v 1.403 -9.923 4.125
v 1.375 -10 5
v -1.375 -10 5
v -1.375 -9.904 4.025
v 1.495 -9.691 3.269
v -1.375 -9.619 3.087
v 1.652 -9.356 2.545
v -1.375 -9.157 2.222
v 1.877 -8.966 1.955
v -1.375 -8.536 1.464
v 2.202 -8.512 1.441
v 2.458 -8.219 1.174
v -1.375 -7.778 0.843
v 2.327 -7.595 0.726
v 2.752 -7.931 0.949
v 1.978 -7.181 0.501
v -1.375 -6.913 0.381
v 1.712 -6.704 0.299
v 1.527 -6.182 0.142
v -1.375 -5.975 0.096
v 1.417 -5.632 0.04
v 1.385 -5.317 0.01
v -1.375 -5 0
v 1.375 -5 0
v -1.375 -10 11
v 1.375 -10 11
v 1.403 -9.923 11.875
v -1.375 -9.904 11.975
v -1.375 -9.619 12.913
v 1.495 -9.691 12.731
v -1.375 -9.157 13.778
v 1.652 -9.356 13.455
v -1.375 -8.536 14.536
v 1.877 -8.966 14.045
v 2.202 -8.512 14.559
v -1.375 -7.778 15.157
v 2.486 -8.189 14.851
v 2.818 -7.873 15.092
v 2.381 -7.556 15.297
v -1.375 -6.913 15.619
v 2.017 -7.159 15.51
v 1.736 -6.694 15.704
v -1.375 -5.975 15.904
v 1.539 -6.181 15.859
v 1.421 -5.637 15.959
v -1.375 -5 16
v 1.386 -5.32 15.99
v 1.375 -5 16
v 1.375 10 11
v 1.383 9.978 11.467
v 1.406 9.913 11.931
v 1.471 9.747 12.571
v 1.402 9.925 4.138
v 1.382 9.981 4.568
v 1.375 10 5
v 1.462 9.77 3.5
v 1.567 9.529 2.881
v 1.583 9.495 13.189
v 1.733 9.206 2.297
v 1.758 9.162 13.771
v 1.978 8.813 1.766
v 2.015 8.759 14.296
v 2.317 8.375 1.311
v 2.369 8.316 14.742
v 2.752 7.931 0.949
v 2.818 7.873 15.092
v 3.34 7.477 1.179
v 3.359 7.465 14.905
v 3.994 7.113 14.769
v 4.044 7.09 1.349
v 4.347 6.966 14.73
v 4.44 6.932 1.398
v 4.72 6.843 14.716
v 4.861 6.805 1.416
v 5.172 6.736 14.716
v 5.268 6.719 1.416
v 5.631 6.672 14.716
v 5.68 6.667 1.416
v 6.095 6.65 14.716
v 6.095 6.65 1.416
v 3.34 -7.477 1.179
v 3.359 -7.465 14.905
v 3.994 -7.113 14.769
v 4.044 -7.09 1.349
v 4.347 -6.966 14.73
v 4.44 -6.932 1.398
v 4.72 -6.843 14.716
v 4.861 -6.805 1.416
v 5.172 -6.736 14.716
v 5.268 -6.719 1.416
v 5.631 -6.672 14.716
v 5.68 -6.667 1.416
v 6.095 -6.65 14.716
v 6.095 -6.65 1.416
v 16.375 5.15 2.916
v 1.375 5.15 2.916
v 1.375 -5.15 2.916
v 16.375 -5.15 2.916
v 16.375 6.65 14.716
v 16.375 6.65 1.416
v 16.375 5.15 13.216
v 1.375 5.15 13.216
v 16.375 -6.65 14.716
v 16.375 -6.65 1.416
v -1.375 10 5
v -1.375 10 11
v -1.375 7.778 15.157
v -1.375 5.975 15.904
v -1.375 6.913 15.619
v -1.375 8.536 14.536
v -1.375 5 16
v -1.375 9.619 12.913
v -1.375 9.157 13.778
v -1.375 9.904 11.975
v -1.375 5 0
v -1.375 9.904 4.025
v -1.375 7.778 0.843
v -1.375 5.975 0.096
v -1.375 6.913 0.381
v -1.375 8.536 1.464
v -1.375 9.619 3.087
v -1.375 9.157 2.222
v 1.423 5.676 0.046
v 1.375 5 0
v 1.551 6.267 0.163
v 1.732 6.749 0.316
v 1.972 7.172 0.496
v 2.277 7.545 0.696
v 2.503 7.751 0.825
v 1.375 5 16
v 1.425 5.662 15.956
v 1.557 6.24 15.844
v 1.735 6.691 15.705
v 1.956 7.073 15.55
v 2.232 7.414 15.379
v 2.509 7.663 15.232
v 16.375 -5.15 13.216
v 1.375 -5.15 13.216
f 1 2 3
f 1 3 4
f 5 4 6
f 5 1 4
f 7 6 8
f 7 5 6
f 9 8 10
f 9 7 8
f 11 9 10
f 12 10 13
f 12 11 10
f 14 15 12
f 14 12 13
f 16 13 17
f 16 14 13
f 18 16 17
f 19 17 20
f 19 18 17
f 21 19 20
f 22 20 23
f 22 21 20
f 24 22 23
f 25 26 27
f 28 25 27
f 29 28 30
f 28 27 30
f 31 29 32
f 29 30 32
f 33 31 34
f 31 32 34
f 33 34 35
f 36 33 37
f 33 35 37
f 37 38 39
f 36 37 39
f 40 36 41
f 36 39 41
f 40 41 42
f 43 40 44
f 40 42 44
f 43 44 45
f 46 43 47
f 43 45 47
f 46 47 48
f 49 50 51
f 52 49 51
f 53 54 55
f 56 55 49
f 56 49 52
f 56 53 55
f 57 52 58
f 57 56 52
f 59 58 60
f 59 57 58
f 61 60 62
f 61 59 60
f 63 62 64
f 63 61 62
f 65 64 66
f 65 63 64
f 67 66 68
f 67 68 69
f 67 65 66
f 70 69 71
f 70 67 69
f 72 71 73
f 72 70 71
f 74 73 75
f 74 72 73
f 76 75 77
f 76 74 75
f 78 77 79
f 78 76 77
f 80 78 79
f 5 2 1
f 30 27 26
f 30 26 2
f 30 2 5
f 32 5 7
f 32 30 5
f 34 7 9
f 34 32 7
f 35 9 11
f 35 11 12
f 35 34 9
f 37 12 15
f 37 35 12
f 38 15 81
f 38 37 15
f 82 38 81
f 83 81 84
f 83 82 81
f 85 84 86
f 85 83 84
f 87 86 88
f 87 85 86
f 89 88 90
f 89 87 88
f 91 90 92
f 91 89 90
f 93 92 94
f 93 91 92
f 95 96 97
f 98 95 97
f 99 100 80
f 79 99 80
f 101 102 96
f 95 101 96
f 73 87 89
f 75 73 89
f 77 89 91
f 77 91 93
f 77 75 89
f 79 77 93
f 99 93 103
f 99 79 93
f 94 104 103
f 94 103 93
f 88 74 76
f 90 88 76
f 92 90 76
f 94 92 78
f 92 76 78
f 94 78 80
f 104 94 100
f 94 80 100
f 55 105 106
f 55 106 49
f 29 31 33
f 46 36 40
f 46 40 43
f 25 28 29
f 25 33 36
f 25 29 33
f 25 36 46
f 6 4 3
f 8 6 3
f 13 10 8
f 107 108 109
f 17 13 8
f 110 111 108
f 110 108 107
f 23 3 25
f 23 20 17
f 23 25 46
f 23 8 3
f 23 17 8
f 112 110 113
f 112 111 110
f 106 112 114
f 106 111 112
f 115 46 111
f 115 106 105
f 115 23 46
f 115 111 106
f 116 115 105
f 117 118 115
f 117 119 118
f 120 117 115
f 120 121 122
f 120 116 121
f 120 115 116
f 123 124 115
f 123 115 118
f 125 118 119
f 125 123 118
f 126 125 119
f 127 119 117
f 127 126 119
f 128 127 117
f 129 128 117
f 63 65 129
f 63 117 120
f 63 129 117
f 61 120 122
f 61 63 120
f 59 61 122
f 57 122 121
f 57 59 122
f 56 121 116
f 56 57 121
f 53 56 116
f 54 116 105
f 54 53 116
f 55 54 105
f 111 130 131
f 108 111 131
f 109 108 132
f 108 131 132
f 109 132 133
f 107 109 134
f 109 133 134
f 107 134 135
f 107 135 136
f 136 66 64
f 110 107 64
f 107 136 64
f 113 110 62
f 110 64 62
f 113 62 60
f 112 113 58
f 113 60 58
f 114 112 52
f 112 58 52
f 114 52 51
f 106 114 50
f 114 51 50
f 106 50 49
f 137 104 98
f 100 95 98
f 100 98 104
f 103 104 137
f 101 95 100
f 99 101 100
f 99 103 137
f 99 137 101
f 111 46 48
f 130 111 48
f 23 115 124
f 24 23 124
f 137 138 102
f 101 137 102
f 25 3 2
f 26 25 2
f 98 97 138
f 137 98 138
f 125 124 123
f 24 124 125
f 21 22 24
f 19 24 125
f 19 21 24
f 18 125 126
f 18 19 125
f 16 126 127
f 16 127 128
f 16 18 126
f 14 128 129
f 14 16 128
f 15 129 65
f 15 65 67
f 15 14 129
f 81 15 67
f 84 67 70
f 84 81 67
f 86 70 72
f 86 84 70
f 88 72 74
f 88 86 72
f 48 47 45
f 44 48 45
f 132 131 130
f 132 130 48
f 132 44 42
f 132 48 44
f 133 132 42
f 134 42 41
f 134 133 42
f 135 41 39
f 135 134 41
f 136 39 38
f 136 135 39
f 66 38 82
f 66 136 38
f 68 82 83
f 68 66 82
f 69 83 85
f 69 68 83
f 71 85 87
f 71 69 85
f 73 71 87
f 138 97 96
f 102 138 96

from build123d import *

# Parameters (mm, degrees)
F0_W         = 2.75
F0_H         = 20
F1_DEPTH     = 16
F2_W         = 5.15
F2_H         = 10.3
F3_DEPTH     = 2.75
F4_DEPTH     = 15
F5_T1_DEPTH  = 13.2999992773
F5_T3_DEPTH  = 13.2999992773
F5_T9_DEPTH  = 21.6634917276
F5_T14_DEPTH = 25.0997612432
F5_T22_DEPTH = 21.6634917276
F5_T27_DEPTH = 25.0997612432
F5_T35_DEPTH = 22.0158699277
F5_T40_DEPTH = 25.0997612432
F5_T48_DEPTH = 25.0997612432
F5_T53_DEPTH = 22.0158699277
F6_R         = 5


# Not quite as in the source:
# - a fillet or chamfer that OpenCascade refuses, or shapes differently, is made with other operations: its cross-section is extruded or revolved along the edge and cut away or added
# - a feature names something its author has since deleted; it is built from what else it names


with BuildPart() as f1:
    # F0 (on Top) → F1 (new body)
    with BuildSketch(Plane.XY):
        Rectangle(F0_W, F0_H)
    extrude(amount=F1_DEPTH)

    # F2 (on face) → F3 (join)
    with BuildSketch(Plane.YZ.offset(1.375)):
        Polygon((0, 16), (-10, 16), (-10, 0), (0, 0), (0, 1.4159553841), (-6.6499996386, 1.4159553841), (-6.6499996386, 14.7159546614), (0, 14.7159546614), align=None)
        Polygon((10, 16), (0, 16), (0, 14.7159546614), (6.6499996386, 14.7159546614), (6.6499996386, 1.4159553841), (0, 1.4159553841), (0, 0), (10, 0), align=None)
        with Locations((-2.575, 8.0659550227)):
            Rectangle(F2_W, F2_H)
        with Locations((2.575, 8.0659550227)):
            Rectangle(F2_W, F2_H)
        Polygon((0, 13.2159550227), (0, 14.7159546614), (-6.6499996386, 14.7159546614), (-6.6499996386, 1.4159553841), (0, 1.4159553841), (0, 2.9159550227), (-5.15, 2.9159550227), (-5.15, 13.2159550227), align=None)
        Polygon((6.6499996386, 14.7159546614), (0, 14.7159546614), (0, 13.2159550227), (5.15, 13.2159550227), (5.15, 2.9159550227), (0, 2.9159550227), (0, 1.4159553841), (6.6499996386, 1.4159553841), align=None)
    extrude(amount=-F3_DEPTH)

    # F2 (on face) → F4 (join)
    with BuildSketch(Plane.YZ.offset(1.375)):
        Polygon((0, 13.2159550227), (0, 14.7159546614), (-6.6499996386, 14.7159546614), (-6.6499996386, 1.4159553841), (0, 1.4159553841), (0, 2.9159550227), (-5.15, 2.9159550227), (-5.15, 13.2159550227), align=None)
        Polygon((6.6499996386, 14.7159546614), (0, 14.7159546614), (0, 13.2159550227), (5.15, 13.2159550227), (5.15, 2.9159550227), (0, 2.9159550227), (0, 1.4159553841), (6.6499996386, 1.4159553841), align=None)
    extrude(amount=F4_DEPTH)

    # F5: fillet of radius 5 on 6 edges, made by hand

    # F5_s2 → F5_t1 (join)
    with BuildSketch(Plane.XZ.offset(-6.6499996386)):
        with BuildLine():
            ThreePointArc((1.375, 16), (2.9287180617, 15.0479907955), (4.7203969801, 14.7159546614))
            Line((4.7203969801, 14.7159546614), (1.375, 14.7159546614))
            Line((1.375, 14.7159546614), (1.375, 16))
        make_face()
        with BuildLine():
            ThreePointArc((1.375, 0), (2.9798891295, 1.0484613517), (4.8613482602, 1.4159553841))
            Line((4.8613482602, 1.4159553841), (1.375, 1.4159553841))
            Line((1.375, 1.4159553841), (1.375, 0))
        make_face()
    extrude(amount=F5_T1_DEPTH)

    # F5_s4 → F5_t3 (join)
    with BuildSketch(Plane.XY.offset(1.4159553841)):
        with BuildLine():
            ThreePointArc((1.375, -10), (3.2009454046, -7.5726231419), (6.0949047864, -6.6499996386))
            Line((6.0949047864, -6.6499996386), (1.375, -6.6499996386))
            Line((1.375, -6.6499996386), (1.375, -10))
        make_face()
        with BuildLine():
            ThreePointArc((1.375, 10), (3.2009454046, 7.5726231419), (6.0949047864, 6.6499996386))
            Line((6.0949047864, 6.6499996386), (1.375, 6.6499996386))
            Line((1.375, 6.6499996386), (1.375, 10))
        make_face()
    extrude(amount=F5_T3_DEPTH)


with BuildPart() as f5_tool7:
    # F5_s8 → F5_t9 (new body)
    with BuildSketch(Plane.XZ.offset(-15.013492089)):
        with BuildLine():
            ThreePointArc((1.375, 16), (2.9287180617, 15.0479907955), (4.7203969801, 14.7159546614))
            Line((4.7203969801, 14.7159546614), (1.375, 14.7159546614))
            Line((1.375, 14.7159546614), (1.375, 16))
        make_face()
    extrude(amount=F5_T9_DEPTH)

    split(bisect_by=Plane.XZ.offset(-10), keep=Keep.TOP)

    split(bisect_by=Plane.XZ.offset(-6.6499996386), keep=Keep.BOTTOM)


with BuildPart() as f5_tool12:
    # F5_s13 → F5_t14 (new body)
    with BuildSketch(Plane.XY.offset(1.4159553841)):
        with BuildLine():
            ThreePointArc((1.375, 10), (3.2009454046, 7.5726231419), (6.0949047864, 6.6499996386))
            Line((6.0949047864, 6.6499996386), (1.375, 6.6499996386))
            Line((1.375, 6.6499996386), (1.375, 10))
        make_face()
    extrude(amount=F5_T14_DEPTH)

    split(bisect_by=Plane.XY.offset(16), keep=Keep.BOTTOM)

    split(bisect_by=Plane.XY.offset(14.7159546614), keep=Keep.TOP)


with BuildPart() as f5_tool7_1:
    add(f5_tool7.part)

    # F5_t17: intersect F5_tool12
    add(f5_tool12.part, mode=Mode.INTERSECT)


with BuildPart() as f1_1:
    add(f1.part)

    # F5_t5: union F5_tool7
    add(f5_tool7_1.part)


with BuildPart() as f5_tool20:
    # F5_s21 → F5_t22 (new body)
    with BuildSketch(Plane.XZ.offset(-6.6499996386)):
        with BuildLine():
            ThreePointArc((1.375, 16), (2.9287180617, 15.0479907955), (4.7203969801, 14.7159546614))
            Line((4.7203969801, 14.7159546614), (1.375, 14.7159546614))
            Line((1.375, 14.7159546614), (1.375, 16))
        make_face()
    extrude(amount=F5_T22_DEPTH)

    split(bisect_by=Plane.XZ.offset(10), keep=Keep.BOTTOM)

    split(bisect_by=Plane.XZ.offset(6.6499996386), keep=Keep.TOP)


with BuildPart() as f5_tool25:
    # F5_s26 → F5_t27 (new body)
    with BuildSketch(Plane.XY.offset(26.5157166273)):
        with BuildLine():
            ThreePointArc((1.375, -10), (3.2009454046, -7.5726231419), (6.0949047864, -6.6499996386))
            Line((6.0949047864, -6.6499996386), (1.375, -6.6499996386))
            Line((1.375, -6.6499996386), (1.375, -10))
        make_face()
    extrude(amount=-F5_T27_DEPTH)

    split(bisect_by=Plane.XY.offset(16), keep=Keep.BOTTOM)

    split(bisect_by=Plane.XY.offset(14.7159546614), keep=Keep.TOP)


with BuildPart() as f5_tool20_1:
    add(f5_tool20.part)

    # F5_t30: intersect F5_tool25
    add(f5_tool25.part, mode=Mode.INTERSECT)


with BuildPart() as f1_2:
    add(f1_1.part)

    # F5_t18: union F5_tool20
    add(f5_tool20_1.part)


with BuildPart() as f5_tool33:
    # F5_s34 → F5_t35 (new body)
    with BuildSketch(Plane.XZ.offset(15.365870289)):
        with BuildLine():
            ThreePointArc((1.375, 0), (2.9798891295, 1.0484613517), (4.8613482602, 1.4159553841))
            Line((4.8613482602, 1.4159553841), (1.375, 1.4159553841))
            Line((1.375, 1.4159553841), (1.375, 0))
        make_face()
    extrude(amount=-F5_T35_DEPTH)

    split(bisect_by=Plane.XZ.offset(10), keep=Keep.BOTTOM)

    split(bisect_by=Plane.XZ.offset(6.6499996386), keep=Keep.TOP)


with BuildPart() as f5_tool38:
    # F5_s39 → F5_t40 (new body)
    with BuildSketch(Plane.XY.offset(14.7159546614)):
        with BuildLine():
            ThreePointArc((1.375, -10), (3.2009454046, -7.5726231419), (6.0949047864, -6.6499996386))
            Line((6.0949047864, -6.6499996386), (1.375, -6.6499996386))
            Line((1.375, -6.6499996386), (1.375, -10))
        make_face()
    extrude(amount=-F5_T40_DEPTH)

    split(bisect_by=Plane.XY, keep=Keep.TOP)

    split(bisect_by=Plane.XY.offset(1.4159553841), keep=Keep.BOTTOM)


with BuildPart() as f5_tool33_1:
    add(f5_tool33.part)

    # F5_t43: intersect F5_tool38
    add(f5_tool38.part, mode=Mode.INTERSECT)


with BuildPart() as f1_3:
    add(f1_2.part)

    # F5_t31: union F5_tool33
    add(f5_tool33_1.part)


with BuildPart() as f5_tool46:
    # F5_s47 → F5_t48 (new body)
    with BuildSketch(Plane.XY.offset(-10.3838065819)):
        with BuildLine():
            ThreePointArc((1.375, 10), (3.2009454046, 7.5726231419), (6.0949047864, 6.6499996386))
            Line((6.0949047864, 6.6499996386), (1.375, 6.6499996386))
            Line((1.375, 6.6499996386), (1.375, 10))
        make_face()
    extrude(amount=F5_T48_DEPTH)

    split(bisect_by=Plane.XY, keep=Keep.TOP)

    split(bisect_by=Plane.XY.offset(1.4159553841), keep=Keep.BOTTOM)


with BuildPart() as f5_tool51:
    # F5_s52 → F5_t53 (new body)
    with BuildSketch(Plane.XZ.offset(6.6499996386)):
        with BuildLine():
            ThreePointArc((1.375, 0), (2.9798891295, 1.0484613517), (4.8613482602, 1.4159553841))
            Line((4.8613482602, 1.4159553841), (1.375, 1.4159553841))
            Line((1.375, 1.4159553841), (1.375, 0))
        make_face()
    extrude(amount=-F5_T53_DEPTH)

    split(bisect_by=Plane.XZ.offset(-10), keep=Keep.TOP)

    split(bisect_by=Plane.XZ.offset(-6.6499996386), keep=Keep.BOTTOM)


with BuildPart() as f5_tool46_1:
    add(f5_tool46.part)

    # F5_t56: intersect F5_tool51
    add(f5_tool51.part, mode=Mode.INTERSECT)


with BuildPart() as f1_4:
    add(f1_3.part)

    # F5_t44: union F5_tool46
    add(f5_tool46_1.part)

    # F6
    f6_edges = [f1_4.edges().sort_by_distance(p)[0] for p in [
        (0, -10, 0),
        (0, -10, 16),
        (0, 10, 16),
        (0, 10, 0),
    ]]
    fillet(f6_edges, radius=F6_R)


solid = f1_4.part
